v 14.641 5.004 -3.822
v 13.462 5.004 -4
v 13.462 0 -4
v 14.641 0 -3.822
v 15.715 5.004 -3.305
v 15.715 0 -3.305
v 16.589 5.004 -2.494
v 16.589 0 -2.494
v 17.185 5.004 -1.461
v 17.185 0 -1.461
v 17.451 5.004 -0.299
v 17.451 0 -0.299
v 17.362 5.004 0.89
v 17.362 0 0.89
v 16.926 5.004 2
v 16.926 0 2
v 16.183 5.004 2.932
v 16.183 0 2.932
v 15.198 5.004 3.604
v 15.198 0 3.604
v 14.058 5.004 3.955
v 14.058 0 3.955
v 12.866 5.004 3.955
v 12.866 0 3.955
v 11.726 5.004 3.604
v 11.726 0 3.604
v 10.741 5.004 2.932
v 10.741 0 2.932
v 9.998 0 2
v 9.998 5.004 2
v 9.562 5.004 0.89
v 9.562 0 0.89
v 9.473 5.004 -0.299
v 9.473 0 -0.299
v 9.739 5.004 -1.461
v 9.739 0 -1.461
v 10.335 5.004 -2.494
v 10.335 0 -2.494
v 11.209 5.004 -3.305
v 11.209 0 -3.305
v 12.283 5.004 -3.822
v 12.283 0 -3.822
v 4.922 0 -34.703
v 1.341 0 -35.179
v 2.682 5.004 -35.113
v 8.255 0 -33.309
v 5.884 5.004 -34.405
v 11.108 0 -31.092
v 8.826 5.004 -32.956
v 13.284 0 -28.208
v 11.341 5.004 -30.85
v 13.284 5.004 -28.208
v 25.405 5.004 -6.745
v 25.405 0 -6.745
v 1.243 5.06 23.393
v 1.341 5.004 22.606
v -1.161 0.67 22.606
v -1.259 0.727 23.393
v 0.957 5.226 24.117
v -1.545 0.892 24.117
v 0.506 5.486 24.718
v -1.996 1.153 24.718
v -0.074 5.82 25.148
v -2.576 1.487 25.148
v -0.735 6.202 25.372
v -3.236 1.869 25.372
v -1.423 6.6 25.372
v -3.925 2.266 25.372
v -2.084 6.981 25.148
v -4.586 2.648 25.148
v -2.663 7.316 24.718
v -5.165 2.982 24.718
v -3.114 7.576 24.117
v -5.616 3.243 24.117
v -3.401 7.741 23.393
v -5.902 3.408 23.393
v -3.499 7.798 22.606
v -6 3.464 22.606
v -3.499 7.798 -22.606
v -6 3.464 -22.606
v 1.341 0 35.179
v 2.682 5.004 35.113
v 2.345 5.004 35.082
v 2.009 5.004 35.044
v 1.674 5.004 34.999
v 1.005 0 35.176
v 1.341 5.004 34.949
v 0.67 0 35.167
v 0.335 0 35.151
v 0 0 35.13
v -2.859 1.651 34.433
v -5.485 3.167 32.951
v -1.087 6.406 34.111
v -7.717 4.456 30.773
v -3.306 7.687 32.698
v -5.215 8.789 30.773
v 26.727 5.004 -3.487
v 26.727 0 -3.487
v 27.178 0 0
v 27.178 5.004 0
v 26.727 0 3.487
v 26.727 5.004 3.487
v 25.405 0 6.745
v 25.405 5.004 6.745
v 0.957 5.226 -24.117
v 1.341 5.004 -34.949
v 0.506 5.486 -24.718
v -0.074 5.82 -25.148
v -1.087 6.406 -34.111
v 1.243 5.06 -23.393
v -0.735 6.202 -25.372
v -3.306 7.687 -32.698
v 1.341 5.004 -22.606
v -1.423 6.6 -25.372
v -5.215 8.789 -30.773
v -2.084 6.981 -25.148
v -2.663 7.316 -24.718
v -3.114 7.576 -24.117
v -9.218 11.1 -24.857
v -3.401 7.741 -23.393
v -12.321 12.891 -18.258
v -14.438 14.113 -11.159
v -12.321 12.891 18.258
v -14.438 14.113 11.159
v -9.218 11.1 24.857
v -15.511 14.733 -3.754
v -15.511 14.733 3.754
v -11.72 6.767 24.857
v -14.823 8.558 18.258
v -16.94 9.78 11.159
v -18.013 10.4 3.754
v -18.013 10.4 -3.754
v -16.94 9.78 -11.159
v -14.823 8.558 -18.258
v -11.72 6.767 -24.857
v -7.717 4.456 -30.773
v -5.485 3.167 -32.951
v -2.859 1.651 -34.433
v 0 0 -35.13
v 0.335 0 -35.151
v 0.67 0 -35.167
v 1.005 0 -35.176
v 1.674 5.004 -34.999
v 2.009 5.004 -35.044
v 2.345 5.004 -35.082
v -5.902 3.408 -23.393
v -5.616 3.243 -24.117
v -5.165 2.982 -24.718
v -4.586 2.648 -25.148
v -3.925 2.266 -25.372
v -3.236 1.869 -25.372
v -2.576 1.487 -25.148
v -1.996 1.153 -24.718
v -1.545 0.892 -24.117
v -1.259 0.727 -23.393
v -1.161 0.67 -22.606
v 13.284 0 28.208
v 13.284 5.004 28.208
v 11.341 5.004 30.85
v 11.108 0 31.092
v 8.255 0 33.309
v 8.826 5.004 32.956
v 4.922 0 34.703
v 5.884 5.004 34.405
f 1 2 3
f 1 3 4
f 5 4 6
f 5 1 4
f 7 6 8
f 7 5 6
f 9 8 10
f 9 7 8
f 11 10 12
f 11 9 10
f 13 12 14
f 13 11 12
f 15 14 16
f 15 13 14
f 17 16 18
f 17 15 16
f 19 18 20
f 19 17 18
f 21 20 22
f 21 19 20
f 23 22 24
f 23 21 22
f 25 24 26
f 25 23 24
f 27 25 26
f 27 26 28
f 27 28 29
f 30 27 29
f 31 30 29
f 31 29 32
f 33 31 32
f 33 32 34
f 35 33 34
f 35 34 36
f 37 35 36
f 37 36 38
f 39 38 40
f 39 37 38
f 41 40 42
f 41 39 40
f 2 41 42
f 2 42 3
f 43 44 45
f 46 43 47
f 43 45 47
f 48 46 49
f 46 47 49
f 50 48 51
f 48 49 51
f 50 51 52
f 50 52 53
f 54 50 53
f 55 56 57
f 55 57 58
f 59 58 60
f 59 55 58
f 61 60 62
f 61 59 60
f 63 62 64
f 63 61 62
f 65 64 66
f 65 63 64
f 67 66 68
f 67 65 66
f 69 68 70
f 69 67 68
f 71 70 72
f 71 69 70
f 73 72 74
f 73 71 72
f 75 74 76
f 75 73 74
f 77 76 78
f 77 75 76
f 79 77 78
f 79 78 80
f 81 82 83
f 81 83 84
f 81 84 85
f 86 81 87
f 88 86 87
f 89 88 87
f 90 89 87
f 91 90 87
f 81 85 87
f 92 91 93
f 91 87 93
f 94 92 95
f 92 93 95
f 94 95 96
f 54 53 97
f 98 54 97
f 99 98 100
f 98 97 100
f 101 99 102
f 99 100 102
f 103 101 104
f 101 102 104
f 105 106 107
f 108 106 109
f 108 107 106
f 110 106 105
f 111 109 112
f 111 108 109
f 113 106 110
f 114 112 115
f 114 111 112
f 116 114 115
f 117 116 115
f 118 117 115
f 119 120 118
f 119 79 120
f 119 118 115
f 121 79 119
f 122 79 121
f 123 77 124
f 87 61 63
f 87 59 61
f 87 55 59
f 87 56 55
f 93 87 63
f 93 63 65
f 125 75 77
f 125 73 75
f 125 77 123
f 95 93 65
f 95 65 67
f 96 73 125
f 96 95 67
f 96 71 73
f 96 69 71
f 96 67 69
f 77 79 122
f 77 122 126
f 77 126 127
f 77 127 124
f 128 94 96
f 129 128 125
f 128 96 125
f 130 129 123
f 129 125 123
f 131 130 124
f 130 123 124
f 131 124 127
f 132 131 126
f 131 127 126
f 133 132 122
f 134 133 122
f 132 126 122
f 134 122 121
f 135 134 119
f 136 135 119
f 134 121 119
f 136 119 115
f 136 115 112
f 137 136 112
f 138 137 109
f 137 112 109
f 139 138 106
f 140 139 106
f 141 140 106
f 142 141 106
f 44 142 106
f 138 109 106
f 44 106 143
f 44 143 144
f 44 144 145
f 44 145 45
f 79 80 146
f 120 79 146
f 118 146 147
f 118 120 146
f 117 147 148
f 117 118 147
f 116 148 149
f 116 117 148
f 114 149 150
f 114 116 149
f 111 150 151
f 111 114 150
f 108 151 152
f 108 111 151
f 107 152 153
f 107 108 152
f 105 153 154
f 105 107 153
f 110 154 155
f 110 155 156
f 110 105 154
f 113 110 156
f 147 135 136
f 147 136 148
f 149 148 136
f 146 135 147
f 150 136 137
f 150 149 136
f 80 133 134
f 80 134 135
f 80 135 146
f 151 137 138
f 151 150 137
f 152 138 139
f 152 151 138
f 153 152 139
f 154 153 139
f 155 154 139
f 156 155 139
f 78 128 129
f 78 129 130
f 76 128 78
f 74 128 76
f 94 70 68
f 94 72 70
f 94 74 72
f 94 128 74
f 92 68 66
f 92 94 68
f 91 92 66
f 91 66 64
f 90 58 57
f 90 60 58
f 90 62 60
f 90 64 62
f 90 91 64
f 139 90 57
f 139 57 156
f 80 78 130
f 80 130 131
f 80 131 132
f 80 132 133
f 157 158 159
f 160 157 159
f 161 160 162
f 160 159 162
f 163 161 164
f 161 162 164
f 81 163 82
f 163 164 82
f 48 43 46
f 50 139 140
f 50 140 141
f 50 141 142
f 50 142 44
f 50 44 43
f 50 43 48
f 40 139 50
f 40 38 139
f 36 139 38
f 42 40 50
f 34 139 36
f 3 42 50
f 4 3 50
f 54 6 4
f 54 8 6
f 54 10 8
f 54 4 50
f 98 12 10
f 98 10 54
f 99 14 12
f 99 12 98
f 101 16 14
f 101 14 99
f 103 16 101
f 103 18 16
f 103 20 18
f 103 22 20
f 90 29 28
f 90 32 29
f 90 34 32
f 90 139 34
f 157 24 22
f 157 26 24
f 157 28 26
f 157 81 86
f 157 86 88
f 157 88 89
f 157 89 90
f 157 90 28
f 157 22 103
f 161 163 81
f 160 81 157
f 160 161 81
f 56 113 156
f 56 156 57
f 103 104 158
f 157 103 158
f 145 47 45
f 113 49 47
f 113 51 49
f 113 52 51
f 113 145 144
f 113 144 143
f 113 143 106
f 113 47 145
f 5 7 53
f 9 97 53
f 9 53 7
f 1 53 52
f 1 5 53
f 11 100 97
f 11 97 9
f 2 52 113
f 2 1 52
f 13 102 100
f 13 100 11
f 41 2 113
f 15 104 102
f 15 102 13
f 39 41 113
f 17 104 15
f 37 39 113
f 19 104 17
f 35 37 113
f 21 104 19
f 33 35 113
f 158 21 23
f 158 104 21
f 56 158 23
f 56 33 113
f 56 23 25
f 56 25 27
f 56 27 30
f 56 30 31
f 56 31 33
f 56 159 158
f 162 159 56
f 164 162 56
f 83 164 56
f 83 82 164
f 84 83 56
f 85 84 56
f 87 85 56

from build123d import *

# Parameters (mm, degrees)
BOSS_EXTRUDE1_DEPTH = 35.179
CUT_EXTRUDE2_START  = -5.0038
SKETCH2_R           = 4
CUT_EXTRUDE2_DEPTH  = 5.0038
CUT_EXTRUDE3_START  = -5.674182
CUT_EXTRUDE3_DEPTH  = 5.674182


with BuildPart() as part:
    # Sketch1 → Boss-Extrude1 (new, symmetric)
    with BuildSketch(Plane.XY):
        Polygon((0, 0), (27.178, 0), (27.178, 5.0038), (1.340764169, 5.0038), (-15.645662336, 14.810917915), (-18.147562336, 10.4775), align=None)
    extrude(amount=BOSS_EXTRUDE1_DEPTH, both=True)

    # Sketch2 → Cut-Extrude2 (cut)
    with BuildSketch(Plane.XZ.offset(CUT_EXTRUDE2_START)):
        with Locations(Location((13.462, 0, 0), (0, 0, 270))):
            Circle(SKETCH2_R)
        with BuildLine():
            Line((1.340764169, 35.179), (53.015235831, 35.179))
            Line((53.015235831, 35.179), (53.015235831, -35.179))
            Line((53.015235831, -35.179), (1.340764169, -35.179))
            ThreePointArc((1.340764169, -35.179), (8.255118058, -33.308689777), (13.28379292, -28.207829149))
            Line((13.28379292, -28.207829149), (25.405028751, -6.744829149))
            ThreePointArc((25.405028751, -6.744829149), (27.178, 0), (25.405028751, 6.744829149))
            Line((25.405028751, 6.744829149), (13.28379292, 28.207829149))
            ThreePointArc((13.28379292, 28.207829149), (8.255118058, 33.308689777), (1.340764169, 35.179))
        make_face()
    extrude(amount=CUT_EXTRUDE2_DEPTH, mode=Mode.SUBTRACT)

    # Sketch3 → Cut-Extrude3 (cut)
    with BuildSketch(Plane(origin=(0, 0, 0), x_dir=(0, 0, 1), z_dir=(-0.4999999999999947, -0.8660254037844417, 0)).offset(CUT_EXTRUDE3_START)):
        with BuildLine():
            Line((22.606, 6.928764169), (-22.606, 6.928764169))
            ThreePointArc((-22.606, 6.928764169), (-25.4, 4.134764169), (-22.606, 1.340764169))
            Line((-22.606, 1.340764169), (22.606, 1.340764169))
            ThreePointArc((22.606, 1.340764169), (25.4, 4.134764169), (22.606, 6.928764169))
        make_face()
        with BuildLine():
            Line((-35.179, -1.161135831), (-35.179, 43.071135831))
            Line((-35.179, 43.071135831), (35.179, 43.071135831))
            Line((35.179, 43.071135831), (35.179, -1.161135831))
            ThreePointArc((35.179, -1.161135831), (34.029362855, 4.335697857), (30.773170225, 8.911072784))
            ThreePointArc((30.773170225, 8.911072784), (0, 20.955), (-30.773170225, 8.911072784))
            ThreePointArc((-30.773170225, 8.911072784), (-34.029362855, 4.335697857), (-35.179, -1.161135831))
        make_face()
    extrude(amount=CUT_EXTRUDE3_DEPTH, mode=Mode.SUBTRACT)


solid = part.part
